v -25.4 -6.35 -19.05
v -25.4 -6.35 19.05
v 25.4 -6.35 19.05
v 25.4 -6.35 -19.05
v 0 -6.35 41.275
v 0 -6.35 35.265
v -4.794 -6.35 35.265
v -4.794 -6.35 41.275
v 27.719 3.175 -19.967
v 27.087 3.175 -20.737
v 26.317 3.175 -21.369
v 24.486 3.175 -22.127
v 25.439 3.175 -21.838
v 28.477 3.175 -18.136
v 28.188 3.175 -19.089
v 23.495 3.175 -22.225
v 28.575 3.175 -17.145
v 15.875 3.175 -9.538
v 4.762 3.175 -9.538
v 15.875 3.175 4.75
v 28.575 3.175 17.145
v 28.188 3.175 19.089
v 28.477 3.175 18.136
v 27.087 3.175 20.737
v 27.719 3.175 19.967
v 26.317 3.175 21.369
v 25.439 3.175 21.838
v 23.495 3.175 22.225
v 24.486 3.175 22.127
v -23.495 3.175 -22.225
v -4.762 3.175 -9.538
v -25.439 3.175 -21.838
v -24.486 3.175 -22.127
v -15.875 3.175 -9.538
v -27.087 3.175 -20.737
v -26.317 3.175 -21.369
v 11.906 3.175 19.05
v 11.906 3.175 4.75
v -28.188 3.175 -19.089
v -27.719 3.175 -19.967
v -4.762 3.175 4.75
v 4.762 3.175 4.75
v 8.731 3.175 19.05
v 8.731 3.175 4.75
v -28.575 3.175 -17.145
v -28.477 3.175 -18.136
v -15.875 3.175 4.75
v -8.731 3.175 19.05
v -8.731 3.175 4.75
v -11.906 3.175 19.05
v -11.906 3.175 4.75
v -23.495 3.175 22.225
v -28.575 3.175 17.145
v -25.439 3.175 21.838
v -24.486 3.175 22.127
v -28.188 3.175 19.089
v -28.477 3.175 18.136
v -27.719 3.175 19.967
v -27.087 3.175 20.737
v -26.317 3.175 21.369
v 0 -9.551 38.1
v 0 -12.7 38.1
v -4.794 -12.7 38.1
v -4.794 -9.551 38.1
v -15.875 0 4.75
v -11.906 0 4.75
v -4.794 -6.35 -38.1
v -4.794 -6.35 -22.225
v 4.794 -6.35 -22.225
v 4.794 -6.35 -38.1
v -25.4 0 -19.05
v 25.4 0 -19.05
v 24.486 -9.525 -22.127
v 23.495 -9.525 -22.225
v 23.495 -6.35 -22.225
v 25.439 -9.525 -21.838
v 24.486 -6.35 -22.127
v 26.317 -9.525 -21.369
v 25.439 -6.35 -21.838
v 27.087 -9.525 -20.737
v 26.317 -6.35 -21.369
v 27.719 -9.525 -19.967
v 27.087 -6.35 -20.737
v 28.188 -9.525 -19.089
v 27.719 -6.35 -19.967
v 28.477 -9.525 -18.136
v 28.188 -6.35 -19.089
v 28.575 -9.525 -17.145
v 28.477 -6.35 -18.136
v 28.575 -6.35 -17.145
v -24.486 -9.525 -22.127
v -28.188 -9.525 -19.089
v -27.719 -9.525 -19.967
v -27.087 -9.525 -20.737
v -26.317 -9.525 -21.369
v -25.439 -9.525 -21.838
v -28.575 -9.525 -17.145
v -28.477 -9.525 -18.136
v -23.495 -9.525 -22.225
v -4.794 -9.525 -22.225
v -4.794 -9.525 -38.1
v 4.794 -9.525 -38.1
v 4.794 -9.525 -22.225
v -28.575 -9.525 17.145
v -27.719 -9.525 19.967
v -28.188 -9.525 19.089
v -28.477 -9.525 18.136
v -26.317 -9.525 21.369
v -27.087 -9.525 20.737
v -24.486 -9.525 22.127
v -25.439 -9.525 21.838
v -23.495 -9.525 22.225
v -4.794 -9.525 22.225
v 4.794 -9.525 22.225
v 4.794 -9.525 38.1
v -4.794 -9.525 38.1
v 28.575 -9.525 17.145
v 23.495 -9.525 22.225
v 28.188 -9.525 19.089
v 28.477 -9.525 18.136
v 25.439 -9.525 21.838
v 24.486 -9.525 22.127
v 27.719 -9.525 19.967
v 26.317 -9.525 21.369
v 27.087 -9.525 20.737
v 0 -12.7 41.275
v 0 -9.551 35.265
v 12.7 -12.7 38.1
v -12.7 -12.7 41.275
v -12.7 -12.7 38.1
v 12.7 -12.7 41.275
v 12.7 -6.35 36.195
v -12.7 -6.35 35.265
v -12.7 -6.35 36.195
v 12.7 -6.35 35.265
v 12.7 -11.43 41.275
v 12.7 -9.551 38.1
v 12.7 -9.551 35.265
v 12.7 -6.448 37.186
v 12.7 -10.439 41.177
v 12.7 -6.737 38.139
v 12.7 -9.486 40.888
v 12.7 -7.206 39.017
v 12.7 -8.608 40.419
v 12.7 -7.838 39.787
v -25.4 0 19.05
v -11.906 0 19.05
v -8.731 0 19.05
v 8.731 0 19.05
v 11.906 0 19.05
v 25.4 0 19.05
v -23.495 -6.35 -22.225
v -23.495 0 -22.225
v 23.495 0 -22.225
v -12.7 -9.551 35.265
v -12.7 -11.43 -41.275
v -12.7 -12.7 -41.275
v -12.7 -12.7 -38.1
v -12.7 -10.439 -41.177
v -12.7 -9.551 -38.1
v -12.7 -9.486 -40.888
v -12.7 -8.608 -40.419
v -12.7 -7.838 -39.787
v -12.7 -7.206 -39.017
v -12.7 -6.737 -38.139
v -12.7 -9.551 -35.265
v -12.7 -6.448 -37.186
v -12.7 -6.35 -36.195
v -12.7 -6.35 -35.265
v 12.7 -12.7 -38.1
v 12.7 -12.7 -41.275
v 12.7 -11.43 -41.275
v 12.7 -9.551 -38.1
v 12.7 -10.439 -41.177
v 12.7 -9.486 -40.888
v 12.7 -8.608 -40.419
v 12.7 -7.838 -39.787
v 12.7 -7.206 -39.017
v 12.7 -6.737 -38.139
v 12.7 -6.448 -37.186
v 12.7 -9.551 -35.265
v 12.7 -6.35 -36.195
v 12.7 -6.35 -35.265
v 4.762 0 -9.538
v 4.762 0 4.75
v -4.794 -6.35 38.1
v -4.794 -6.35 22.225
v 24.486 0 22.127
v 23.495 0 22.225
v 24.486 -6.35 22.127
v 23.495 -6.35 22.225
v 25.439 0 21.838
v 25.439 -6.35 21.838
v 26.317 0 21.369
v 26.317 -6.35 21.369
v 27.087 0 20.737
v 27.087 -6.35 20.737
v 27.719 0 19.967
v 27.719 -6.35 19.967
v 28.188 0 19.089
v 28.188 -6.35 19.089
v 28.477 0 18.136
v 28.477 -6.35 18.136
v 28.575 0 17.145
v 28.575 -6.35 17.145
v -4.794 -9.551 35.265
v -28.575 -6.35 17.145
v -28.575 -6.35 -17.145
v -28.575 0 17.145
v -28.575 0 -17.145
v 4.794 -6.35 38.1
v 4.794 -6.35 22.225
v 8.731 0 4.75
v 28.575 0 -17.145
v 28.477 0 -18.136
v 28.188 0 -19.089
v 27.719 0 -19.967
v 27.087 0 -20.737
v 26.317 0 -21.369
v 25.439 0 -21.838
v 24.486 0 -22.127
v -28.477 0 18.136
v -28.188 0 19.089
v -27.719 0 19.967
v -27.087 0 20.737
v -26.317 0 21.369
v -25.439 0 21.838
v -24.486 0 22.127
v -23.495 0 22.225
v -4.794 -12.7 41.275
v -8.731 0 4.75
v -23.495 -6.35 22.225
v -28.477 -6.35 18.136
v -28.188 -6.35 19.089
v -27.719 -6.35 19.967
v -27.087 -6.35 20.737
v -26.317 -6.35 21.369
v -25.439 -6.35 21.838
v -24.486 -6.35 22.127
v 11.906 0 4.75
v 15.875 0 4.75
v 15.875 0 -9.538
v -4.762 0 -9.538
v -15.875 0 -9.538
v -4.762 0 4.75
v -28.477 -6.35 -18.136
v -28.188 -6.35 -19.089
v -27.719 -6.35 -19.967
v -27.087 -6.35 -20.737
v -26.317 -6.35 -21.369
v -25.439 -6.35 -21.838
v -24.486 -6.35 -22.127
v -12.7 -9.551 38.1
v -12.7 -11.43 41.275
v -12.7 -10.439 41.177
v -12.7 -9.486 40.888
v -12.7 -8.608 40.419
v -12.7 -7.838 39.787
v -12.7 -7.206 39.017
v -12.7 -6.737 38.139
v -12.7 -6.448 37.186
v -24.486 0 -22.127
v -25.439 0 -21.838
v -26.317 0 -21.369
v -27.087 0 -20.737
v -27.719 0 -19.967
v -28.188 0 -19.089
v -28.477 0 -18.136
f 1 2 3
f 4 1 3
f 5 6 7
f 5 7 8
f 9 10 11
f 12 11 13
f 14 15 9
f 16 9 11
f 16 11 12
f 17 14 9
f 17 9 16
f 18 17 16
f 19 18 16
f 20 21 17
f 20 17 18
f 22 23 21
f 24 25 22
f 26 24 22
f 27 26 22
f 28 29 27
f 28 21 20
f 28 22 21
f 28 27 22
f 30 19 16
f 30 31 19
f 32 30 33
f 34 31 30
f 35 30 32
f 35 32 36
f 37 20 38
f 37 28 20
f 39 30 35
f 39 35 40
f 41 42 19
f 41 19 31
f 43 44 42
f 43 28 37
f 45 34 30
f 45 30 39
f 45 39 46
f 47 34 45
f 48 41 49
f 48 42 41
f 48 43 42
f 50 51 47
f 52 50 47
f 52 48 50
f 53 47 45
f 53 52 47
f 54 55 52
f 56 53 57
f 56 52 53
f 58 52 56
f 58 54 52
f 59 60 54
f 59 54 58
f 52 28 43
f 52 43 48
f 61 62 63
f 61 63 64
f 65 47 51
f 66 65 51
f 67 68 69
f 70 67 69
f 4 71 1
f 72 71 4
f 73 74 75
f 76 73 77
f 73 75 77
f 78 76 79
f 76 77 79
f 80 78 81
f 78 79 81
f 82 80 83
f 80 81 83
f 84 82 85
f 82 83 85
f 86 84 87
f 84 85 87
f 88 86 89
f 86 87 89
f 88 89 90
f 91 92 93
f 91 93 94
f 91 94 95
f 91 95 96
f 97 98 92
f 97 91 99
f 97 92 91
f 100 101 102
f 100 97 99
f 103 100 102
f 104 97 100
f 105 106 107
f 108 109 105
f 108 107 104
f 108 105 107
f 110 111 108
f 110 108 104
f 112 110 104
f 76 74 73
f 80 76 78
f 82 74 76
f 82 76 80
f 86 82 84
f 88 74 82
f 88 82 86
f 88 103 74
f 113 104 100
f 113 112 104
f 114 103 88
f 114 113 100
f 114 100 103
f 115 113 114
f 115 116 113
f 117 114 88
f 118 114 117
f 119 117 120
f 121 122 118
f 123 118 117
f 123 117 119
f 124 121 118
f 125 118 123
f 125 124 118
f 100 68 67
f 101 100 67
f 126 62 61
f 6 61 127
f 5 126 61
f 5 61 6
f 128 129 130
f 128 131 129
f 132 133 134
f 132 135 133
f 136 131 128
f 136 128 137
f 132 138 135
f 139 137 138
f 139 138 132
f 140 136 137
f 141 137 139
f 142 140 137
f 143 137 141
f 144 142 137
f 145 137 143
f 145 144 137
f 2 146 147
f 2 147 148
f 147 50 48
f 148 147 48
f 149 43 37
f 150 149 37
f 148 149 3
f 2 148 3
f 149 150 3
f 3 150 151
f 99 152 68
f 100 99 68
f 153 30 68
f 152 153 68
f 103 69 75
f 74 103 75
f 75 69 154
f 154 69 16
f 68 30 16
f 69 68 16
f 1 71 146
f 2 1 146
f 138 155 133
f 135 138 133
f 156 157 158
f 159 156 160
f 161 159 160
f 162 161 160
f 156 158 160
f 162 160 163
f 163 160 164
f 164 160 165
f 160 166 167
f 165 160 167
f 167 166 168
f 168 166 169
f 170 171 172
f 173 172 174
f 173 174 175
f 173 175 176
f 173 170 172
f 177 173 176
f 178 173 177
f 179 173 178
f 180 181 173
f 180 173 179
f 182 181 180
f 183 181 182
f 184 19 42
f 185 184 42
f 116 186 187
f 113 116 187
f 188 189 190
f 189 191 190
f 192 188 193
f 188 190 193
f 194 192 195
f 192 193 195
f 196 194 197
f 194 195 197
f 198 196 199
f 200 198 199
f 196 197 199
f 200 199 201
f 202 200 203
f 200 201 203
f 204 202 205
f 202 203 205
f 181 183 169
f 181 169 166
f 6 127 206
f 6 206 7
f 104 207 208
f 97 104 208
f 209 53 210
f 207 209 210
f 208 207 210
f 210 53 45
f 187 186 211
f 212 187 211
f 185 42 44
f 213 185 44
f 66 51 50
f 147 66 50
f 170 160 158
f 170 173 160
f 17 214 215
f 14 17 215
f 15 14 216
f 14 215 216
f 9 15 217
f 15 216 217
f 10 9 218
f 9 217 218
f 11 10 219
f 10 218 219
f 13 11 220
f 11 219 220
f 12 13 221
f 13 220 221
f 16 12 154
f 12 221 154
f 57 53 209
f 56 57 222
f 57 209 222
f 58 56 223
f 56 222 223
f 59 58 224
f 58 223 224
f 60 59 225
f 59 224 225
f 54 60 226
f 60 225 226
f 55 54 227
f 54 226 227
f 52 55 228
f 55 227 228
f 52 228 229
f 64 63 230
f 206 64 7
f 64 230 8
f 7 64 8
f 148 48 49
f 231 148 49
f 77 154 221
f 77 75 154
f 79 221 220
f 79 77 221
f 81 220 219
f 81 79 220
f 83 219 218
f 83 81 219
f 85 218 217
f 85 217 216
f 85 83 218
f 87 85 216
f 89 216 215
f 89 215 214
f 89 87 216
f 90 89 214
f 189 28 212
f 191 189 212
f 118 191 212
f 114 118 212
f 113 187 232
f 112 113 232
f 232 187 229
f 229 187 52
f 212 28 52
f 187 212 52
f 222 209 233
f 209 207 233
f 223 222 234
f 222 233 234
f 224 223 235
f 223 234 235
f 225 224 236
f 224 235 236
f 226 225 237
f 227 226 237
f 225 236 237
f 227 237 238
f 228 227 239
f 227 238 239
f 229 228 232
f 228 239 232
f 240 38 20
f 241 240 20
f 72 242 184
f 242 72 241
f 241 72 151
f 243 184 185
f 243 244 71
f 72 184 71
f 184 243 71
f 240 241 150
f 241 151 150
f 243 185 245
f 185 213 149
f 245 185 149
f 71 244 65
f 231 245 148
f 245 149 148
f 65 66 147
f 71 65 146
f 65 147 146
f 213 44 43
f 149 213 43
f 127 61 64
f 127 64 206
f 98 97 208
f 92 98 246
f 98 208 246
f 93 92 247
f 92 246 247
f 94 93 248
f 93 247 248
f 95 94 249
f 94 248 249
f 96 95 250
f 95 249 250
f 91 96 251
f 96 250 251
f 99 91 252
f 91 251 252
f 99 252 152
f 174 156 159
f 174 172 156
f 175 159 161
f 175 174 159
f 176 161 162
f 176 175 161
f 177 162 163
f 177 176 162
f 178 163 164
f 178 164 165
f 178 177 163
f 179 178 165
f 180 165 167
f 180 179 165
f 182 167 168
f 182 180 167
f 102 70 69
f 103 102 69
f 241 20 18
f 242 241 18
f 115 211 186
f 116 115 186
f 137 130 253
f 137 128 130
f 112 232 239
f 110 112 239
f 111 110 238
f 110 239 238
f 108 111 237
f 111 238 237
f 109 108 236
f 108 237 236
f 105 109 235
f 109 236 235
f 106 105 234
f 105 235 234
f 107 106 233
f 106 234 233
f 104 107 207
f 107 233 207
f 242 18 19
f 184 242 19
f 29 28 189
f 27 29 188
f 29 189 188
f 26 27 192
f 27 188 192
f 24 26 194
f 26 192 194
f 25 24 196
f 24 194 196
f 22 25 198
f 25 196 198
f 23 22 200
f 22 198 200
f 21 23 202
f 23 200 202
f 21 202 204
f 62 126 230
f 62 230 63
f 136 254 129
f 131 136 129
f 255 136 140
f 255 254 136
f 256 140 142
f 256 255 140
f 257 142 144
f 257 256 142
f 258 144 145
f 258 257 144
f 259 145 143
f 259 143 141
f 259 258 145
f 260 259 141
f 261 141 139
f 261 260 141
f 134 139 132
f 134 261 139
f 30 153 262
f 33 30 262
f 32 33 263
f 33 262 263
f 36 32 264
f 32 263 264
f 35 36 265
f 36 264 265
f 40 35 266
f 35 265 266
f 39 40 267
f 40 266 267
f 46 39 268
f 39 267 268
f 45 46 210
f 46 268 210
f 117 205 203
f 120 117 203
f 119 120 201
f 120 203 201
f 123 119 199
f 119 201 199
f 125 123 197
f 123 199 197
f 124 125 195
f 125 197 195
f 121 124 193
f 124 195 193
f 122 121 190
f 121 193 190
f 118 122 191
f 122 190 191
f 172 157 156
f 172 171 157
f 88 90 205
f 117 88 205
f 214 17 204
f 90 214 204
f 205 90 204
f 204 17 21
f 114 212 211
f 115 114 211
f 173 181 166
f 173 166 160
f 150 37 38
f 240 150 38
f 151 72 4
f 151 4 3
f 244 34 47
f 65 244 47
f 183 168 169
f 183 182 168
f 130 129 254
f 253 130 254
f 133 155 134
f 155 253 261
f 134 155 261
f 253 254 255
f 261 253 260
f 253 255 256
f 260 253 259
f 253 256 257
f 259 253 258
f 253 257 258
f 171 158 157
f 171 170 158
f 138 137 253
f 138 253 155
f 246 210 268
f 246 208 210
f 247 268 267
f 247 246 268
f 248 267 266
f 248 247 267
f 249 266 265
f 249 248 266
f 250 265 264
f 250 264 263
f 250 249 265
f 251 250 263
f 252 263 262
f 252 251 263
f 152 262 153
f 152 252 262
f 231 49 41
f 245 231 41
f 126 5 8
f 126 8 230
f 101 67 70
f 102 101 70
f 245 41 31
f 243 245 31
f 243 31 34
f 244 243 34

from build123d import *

# Parameters (mm, degrees)
F0_W           = 57.15
F0_H           = 44.45
F0_W_2         = 50.8
F0_H_2         = 38.1
F1_DEPTH       = 6.35
F2_R           = 5.08
F4_DEPTH       = 3.175
F6_DEPTH       = 25.4
F8_DEPTH       = 3.175
F10_DEPTH      = 4.7937016934
F11_DEPTH      = 12.7
F11_DEPTH_BACK = 12.7
F12_R          = 5.08


with BuildPart() as f1:
    # F0 (on Front) → F1 (new body)
    with BuildSketch(Plane.XZ):
        Rectangle(F0_W, F0_H)
        Rectangle(F0_W_2, F0_H_2, mode=Mode.SUBTRACT)
    extrude(amount=F1_DEPTH)

    # F2
    f2_edges = [f1.edges().sort_by_distance(p)[0] for p in [
        (-28.575, -3.175, 22.225),
        (28.575, -3.175, 22.225),
        (28.575, -3.175, -22.225),
        (-28.575, -3.175, -22.225),
    ]]
    fillet(f2_edges, radius=F2_R)

    # F3 (on face) → F4 (join)
    with BuildSketch(Plane(origin=(0, 0, 0), x_dir=(-1, 0, 0), z_dir=(0, 1, 0))):
        with BuildLine():
            Line((23.495, 22.225), (-23.495, 22.225))
            ThreePointArc((-23.495, 22.225), (-27.0871024484, 20.7371024484), (-28.575, 17.145))
            Line((-28.575, 17.145), (-28.575, -17.145))
            ThreePointArc((-28.575, -17.145), (-27.0871024484, -20.7371024484), (-23.495, -22.225))
            Line((-23.495, -22.225), (23.495, -22.225))
            ThreePointArc((23.495, -22.225), (27.0871024484, -20.7371024484), (28.575, -17.145))
            Line((28.575, -17.145), (28.575, 17.145))
            ThreePointArc((28.575, 17.145), (27.0871024484, 20.7371024484), (23.495, 22.225))
        make_face()
    extrude(amount=F4_DEPTH)

    # F5 (on face) → F6 (cut)
    with BuildSketch(Plane(origin=(0, 3.175, 0), x_dir=(-1, 0, 0), z_dir=(0, 1, 0))):
        Polygon((-8.73125, 4.7498), (-8.73125, 19.05), (-11.90625, 19.05), (-11.90625, 4.7498), (-15.875, 4.7498), (-15.875, -9.5377), (-4.7625, -9.5377), (-4.7625, 4.7498), align=None)
        Polygon((15.875, 4.7498), (11.90625, 4.7498), (11.90625, 19.05), (8.73125, 19.05), (8.73125, 4.7498), (4.7625, 4.7498), (4.7625, -9.5377), (15.875, -9.5377), align=None)
    extrude(amount=-F6_DEPTH, mode=Mode.SUBTRACT)

    # F7 (on face) → F8 (join)
    with BuildSketch(Plane.XZ.offset(6.35)):
        with BuildLine():
            Line((-4.7937016934, 22.225), (-23.495, 22.225))
            ThreePointArc((-23.495, 22.225), (-27.0871024484, 20.7371024484), (-28.575, 17.145))
            Line((-28.575, 17.145), (-28.575, -17.145))
            ThreePointArc((-28.575, -17.145), (-27.0871024484, -20.7371024484), (-23.495, -22.225))
            Line((-23.495, -22.225), (-4.7937016934, -22.225))
            Line((-4.7937016934, -22.225), (-4.7937016934, -38.1))
            Line((-4.7937016934, -38.1), (4.7937016934, -38.1))
            Line((4.7937016934, -38.1), (4.7937016934, -22.225))
            Line((4.7937016934, -22.225), (23.495, -22.225))
            ThreePointArc((23.495, -22.225), (27.0871024484, -20.7371024484), (28.575, -17.145))
            Line((28.575, -17.145), (28.575, 17.145))
            ThreePointArc((28.575, 17.145), (27.0871024484, 20.7371024484), (23.495, 22.225))
            Line((23.495, 22.225), (4.7937016934, 22.225))
            Line((4.7937016934, 22.225), (4.7937016934, 38.1))
            Line((4.7937016934, 38.1), (-4.7937016934, 38.1))
            Line((-4.7937016934, 38.1), (-4.7937016934, 22.225))
        make_face()
    extrude(amount=F8_DEPTH)


with BuildPart() as f10:
    # F9 (on Right) → F10 (new body, through all)
    with BuildSketch(Plane.YZ):
        Polygon((-12.7, 38.1), (-9.5510641113, 38.1), (-9.5510641113, 35.2650918067), (-6.35, 35.2650918067), (-6.35, 38.1), (-6.35, 41.275), (-12.7, 41.275), align=None)
    extrude(amount=-F10_DEPTH)


with BuildPart() as f11:
    # F9 (on Right) → F11 (new body, two sides)
    with BuildSketch(Plane.YZ) as f11_sk:
        Polygon((-12.7, 38.1), (-9.5510641113, 38.1), (-9.5510641113, 35.2650918067), (-6.35, 35.2650918067), (-6.35, 38.1), (-6.35, 41.275), (-12.7, 41.275), align=None)
        Polygon((-12.7, -41.275), (-6.35, -41.275), (-6.35, -38.1), (-6.35, -35.2650918067), (-9.5510641113, -35.2650918067), (-9.5510641113, -38.1), (-12.7, -38.1), align=None)
    extrude(amount=F11_DEPTH)
    extrude(f11_sk.sketch, amount=-F11_DEPTH_BACK)

    # F12
    f12_edges = [f11.edges().sort_by_distance(p)[0] for p in [
        (0, -6.35, 41.275),
        (0, -6.35, -41.275),
    ]]
    fillet(f12_edges, radius=F12_R)


solid = Compound([f1.part, f10.part, f11.part])
